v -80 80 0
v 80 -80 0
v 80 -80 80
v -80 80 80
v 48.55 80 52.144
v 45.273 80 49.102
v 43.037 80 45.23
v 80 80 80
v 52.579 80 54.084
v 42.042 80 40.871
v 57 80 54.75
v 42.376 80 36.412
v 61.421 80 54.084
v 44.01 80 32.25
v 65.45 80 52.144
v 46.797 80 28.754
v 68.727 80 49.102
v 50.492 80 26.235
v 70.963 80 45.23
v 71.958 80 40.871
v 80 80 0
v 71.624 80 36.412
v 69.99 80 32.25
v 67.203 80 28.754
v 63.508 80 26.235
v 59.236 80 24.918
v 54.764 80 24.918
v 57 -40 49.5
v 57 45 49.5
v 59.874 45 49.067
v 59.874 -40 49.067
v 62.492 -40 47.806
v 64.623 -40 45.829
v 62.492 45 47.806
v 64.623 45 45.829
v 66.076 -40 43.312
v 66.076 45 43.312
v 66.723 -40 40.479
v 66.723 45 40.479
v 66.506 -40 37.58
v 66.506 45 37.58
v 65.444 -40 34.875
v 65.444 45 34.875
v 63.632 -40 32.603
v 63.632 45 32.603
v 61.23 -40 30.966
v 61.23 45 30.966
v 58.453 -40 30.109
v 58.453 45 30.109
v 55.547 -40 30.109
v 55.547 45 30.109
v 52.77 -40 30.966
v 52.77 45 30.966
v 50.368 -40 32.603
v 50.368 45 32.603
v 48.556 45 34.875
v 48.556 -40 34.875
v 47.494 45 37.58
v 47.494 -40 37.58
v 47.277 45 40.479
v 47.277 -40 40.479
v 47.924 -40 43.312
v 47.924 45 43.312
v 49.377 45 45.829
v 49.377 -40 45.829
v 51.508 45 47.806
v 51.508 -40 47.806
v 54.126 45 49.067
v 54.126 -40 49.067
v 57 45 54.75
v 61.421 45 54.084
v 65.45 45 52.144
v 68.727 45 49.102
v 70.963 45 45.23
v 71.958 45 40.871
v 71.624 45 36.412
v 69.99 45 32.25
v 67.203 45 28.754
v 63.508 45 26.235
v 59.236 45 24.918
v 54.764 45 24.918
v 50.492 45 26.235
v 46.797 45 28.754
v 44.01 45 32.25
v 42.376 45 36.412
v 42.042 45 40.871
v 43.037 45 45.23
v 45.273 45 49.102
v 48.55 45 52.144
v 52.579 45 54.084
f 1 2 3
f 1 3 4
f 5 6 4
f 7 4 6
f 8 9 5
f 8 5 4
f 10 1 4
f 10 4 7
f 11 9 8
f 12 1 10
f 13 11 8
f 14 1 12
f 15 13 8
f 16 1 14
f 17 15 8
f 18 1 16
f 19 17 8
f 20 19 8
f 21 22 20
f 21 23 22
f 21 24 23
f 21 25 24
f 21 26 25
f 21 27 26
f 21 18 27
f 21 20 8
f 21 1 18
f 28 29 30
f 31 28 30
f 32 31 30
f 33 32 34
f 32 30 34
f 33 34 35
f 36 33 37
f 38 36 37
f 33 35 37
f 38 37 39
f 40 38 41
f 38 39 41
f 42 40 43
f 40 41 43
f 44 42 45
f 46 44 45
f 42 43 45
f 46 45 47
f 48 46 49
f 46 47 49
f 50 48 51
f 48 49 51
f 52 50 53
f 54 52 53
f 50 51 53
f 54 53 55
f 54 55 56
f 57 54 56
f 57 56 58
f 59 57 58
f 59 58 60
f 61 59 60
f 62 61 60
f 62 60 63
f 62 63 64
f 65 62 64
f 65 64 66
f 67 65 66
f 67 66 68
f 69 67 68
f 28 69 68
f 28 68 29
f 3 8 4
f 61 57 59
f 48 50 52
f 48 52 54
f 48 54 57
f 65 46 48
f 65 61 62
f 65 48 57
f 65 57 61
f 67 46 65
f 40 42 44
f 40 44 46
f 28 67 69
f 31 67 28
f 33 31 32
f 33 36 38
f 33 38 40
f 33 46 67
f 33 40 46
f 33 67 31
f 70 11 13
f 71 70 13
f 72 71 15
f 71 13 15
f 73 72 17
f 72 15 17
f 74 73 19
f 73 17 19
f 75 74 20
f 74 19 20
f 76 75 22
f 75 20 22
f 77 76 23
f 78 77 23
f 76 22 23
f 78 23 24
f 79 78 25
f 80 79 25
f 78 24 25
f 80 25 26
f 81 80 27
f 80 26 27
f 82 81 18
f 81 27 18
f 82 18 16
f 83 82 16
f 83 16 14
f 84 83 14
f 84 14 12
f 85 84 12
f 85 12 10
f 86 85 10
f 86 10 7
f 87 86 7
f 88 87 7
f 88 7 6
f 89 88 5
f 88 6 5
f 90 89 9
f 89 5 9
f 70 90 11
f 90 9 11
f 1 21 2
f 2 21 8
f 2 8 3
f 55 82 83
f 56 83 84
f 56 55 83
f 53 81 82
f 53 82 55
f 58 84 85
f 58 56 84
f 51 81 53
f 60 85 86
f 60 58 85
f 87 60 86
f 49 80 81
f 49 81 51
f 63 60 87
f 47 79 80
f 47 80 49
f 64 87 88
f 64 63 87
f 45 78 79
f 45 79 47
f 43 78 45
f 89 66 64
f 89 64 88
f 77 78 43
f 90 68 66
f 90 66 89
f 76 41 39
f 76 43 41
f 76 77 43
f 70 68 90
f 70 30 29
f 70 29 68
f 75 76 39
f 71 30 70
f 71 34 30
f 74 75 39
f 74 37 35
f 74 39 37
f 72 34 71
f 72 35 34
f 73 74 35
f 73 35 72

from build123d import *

# Parameters (mm, degrees)
BOSS_EXTRUDE1_DEPTH = 80
SKETCH2_R           = 15
CUT_EXTRUDE1_DEPTH  = 35
CUT_EXTRUDE2_START  = 35
SKETCH3_R           = 9.75
CUT_EXTRUDE2_DEPTH  = 120


with BuildPart() as part:
    # Sketch1 → Boss-Extrude1 (new body)
    with BuildSketch(Plane.XY):
        Polygon((80, 80), (80, -80), (-80, 80), align=None)
    extrude(amount=BOSS_EXTRUDE1_DEPTH)

    # Sketch2 → Cut-Extrude1 (cut)
    with BuildSketch(Plane(origin=(0, 80, 0), x_dir=(1, 0, 0), z_dir=(0, 1, 0))):
        with Locations(Location((57, -39.75, 0), (0, 0, 270))):
            Circle(SKETCH2_R)
    extrude(amount=-CUT_EXTRUDE1_DEPTH, mode=Mode.SUBTRACT)

    # Sketch3 → Cut-Extrude2 (cut)
    with BuildSketch(Plane(origin=(0, 45, 0), x_dir=(1, 0, 0), z_dir=(0, 1, 0)).offset(CUT_EXTRUDE2_START)):
        with Locations(Location((57, -39.75, 0), (0, 0, 270))):
            Circle(SKETCH3_R)
    extrude(amount=-CUT_EXTRUDE2_DEPTH, mode=Mode.SUBTRACT)


solid = part.part
